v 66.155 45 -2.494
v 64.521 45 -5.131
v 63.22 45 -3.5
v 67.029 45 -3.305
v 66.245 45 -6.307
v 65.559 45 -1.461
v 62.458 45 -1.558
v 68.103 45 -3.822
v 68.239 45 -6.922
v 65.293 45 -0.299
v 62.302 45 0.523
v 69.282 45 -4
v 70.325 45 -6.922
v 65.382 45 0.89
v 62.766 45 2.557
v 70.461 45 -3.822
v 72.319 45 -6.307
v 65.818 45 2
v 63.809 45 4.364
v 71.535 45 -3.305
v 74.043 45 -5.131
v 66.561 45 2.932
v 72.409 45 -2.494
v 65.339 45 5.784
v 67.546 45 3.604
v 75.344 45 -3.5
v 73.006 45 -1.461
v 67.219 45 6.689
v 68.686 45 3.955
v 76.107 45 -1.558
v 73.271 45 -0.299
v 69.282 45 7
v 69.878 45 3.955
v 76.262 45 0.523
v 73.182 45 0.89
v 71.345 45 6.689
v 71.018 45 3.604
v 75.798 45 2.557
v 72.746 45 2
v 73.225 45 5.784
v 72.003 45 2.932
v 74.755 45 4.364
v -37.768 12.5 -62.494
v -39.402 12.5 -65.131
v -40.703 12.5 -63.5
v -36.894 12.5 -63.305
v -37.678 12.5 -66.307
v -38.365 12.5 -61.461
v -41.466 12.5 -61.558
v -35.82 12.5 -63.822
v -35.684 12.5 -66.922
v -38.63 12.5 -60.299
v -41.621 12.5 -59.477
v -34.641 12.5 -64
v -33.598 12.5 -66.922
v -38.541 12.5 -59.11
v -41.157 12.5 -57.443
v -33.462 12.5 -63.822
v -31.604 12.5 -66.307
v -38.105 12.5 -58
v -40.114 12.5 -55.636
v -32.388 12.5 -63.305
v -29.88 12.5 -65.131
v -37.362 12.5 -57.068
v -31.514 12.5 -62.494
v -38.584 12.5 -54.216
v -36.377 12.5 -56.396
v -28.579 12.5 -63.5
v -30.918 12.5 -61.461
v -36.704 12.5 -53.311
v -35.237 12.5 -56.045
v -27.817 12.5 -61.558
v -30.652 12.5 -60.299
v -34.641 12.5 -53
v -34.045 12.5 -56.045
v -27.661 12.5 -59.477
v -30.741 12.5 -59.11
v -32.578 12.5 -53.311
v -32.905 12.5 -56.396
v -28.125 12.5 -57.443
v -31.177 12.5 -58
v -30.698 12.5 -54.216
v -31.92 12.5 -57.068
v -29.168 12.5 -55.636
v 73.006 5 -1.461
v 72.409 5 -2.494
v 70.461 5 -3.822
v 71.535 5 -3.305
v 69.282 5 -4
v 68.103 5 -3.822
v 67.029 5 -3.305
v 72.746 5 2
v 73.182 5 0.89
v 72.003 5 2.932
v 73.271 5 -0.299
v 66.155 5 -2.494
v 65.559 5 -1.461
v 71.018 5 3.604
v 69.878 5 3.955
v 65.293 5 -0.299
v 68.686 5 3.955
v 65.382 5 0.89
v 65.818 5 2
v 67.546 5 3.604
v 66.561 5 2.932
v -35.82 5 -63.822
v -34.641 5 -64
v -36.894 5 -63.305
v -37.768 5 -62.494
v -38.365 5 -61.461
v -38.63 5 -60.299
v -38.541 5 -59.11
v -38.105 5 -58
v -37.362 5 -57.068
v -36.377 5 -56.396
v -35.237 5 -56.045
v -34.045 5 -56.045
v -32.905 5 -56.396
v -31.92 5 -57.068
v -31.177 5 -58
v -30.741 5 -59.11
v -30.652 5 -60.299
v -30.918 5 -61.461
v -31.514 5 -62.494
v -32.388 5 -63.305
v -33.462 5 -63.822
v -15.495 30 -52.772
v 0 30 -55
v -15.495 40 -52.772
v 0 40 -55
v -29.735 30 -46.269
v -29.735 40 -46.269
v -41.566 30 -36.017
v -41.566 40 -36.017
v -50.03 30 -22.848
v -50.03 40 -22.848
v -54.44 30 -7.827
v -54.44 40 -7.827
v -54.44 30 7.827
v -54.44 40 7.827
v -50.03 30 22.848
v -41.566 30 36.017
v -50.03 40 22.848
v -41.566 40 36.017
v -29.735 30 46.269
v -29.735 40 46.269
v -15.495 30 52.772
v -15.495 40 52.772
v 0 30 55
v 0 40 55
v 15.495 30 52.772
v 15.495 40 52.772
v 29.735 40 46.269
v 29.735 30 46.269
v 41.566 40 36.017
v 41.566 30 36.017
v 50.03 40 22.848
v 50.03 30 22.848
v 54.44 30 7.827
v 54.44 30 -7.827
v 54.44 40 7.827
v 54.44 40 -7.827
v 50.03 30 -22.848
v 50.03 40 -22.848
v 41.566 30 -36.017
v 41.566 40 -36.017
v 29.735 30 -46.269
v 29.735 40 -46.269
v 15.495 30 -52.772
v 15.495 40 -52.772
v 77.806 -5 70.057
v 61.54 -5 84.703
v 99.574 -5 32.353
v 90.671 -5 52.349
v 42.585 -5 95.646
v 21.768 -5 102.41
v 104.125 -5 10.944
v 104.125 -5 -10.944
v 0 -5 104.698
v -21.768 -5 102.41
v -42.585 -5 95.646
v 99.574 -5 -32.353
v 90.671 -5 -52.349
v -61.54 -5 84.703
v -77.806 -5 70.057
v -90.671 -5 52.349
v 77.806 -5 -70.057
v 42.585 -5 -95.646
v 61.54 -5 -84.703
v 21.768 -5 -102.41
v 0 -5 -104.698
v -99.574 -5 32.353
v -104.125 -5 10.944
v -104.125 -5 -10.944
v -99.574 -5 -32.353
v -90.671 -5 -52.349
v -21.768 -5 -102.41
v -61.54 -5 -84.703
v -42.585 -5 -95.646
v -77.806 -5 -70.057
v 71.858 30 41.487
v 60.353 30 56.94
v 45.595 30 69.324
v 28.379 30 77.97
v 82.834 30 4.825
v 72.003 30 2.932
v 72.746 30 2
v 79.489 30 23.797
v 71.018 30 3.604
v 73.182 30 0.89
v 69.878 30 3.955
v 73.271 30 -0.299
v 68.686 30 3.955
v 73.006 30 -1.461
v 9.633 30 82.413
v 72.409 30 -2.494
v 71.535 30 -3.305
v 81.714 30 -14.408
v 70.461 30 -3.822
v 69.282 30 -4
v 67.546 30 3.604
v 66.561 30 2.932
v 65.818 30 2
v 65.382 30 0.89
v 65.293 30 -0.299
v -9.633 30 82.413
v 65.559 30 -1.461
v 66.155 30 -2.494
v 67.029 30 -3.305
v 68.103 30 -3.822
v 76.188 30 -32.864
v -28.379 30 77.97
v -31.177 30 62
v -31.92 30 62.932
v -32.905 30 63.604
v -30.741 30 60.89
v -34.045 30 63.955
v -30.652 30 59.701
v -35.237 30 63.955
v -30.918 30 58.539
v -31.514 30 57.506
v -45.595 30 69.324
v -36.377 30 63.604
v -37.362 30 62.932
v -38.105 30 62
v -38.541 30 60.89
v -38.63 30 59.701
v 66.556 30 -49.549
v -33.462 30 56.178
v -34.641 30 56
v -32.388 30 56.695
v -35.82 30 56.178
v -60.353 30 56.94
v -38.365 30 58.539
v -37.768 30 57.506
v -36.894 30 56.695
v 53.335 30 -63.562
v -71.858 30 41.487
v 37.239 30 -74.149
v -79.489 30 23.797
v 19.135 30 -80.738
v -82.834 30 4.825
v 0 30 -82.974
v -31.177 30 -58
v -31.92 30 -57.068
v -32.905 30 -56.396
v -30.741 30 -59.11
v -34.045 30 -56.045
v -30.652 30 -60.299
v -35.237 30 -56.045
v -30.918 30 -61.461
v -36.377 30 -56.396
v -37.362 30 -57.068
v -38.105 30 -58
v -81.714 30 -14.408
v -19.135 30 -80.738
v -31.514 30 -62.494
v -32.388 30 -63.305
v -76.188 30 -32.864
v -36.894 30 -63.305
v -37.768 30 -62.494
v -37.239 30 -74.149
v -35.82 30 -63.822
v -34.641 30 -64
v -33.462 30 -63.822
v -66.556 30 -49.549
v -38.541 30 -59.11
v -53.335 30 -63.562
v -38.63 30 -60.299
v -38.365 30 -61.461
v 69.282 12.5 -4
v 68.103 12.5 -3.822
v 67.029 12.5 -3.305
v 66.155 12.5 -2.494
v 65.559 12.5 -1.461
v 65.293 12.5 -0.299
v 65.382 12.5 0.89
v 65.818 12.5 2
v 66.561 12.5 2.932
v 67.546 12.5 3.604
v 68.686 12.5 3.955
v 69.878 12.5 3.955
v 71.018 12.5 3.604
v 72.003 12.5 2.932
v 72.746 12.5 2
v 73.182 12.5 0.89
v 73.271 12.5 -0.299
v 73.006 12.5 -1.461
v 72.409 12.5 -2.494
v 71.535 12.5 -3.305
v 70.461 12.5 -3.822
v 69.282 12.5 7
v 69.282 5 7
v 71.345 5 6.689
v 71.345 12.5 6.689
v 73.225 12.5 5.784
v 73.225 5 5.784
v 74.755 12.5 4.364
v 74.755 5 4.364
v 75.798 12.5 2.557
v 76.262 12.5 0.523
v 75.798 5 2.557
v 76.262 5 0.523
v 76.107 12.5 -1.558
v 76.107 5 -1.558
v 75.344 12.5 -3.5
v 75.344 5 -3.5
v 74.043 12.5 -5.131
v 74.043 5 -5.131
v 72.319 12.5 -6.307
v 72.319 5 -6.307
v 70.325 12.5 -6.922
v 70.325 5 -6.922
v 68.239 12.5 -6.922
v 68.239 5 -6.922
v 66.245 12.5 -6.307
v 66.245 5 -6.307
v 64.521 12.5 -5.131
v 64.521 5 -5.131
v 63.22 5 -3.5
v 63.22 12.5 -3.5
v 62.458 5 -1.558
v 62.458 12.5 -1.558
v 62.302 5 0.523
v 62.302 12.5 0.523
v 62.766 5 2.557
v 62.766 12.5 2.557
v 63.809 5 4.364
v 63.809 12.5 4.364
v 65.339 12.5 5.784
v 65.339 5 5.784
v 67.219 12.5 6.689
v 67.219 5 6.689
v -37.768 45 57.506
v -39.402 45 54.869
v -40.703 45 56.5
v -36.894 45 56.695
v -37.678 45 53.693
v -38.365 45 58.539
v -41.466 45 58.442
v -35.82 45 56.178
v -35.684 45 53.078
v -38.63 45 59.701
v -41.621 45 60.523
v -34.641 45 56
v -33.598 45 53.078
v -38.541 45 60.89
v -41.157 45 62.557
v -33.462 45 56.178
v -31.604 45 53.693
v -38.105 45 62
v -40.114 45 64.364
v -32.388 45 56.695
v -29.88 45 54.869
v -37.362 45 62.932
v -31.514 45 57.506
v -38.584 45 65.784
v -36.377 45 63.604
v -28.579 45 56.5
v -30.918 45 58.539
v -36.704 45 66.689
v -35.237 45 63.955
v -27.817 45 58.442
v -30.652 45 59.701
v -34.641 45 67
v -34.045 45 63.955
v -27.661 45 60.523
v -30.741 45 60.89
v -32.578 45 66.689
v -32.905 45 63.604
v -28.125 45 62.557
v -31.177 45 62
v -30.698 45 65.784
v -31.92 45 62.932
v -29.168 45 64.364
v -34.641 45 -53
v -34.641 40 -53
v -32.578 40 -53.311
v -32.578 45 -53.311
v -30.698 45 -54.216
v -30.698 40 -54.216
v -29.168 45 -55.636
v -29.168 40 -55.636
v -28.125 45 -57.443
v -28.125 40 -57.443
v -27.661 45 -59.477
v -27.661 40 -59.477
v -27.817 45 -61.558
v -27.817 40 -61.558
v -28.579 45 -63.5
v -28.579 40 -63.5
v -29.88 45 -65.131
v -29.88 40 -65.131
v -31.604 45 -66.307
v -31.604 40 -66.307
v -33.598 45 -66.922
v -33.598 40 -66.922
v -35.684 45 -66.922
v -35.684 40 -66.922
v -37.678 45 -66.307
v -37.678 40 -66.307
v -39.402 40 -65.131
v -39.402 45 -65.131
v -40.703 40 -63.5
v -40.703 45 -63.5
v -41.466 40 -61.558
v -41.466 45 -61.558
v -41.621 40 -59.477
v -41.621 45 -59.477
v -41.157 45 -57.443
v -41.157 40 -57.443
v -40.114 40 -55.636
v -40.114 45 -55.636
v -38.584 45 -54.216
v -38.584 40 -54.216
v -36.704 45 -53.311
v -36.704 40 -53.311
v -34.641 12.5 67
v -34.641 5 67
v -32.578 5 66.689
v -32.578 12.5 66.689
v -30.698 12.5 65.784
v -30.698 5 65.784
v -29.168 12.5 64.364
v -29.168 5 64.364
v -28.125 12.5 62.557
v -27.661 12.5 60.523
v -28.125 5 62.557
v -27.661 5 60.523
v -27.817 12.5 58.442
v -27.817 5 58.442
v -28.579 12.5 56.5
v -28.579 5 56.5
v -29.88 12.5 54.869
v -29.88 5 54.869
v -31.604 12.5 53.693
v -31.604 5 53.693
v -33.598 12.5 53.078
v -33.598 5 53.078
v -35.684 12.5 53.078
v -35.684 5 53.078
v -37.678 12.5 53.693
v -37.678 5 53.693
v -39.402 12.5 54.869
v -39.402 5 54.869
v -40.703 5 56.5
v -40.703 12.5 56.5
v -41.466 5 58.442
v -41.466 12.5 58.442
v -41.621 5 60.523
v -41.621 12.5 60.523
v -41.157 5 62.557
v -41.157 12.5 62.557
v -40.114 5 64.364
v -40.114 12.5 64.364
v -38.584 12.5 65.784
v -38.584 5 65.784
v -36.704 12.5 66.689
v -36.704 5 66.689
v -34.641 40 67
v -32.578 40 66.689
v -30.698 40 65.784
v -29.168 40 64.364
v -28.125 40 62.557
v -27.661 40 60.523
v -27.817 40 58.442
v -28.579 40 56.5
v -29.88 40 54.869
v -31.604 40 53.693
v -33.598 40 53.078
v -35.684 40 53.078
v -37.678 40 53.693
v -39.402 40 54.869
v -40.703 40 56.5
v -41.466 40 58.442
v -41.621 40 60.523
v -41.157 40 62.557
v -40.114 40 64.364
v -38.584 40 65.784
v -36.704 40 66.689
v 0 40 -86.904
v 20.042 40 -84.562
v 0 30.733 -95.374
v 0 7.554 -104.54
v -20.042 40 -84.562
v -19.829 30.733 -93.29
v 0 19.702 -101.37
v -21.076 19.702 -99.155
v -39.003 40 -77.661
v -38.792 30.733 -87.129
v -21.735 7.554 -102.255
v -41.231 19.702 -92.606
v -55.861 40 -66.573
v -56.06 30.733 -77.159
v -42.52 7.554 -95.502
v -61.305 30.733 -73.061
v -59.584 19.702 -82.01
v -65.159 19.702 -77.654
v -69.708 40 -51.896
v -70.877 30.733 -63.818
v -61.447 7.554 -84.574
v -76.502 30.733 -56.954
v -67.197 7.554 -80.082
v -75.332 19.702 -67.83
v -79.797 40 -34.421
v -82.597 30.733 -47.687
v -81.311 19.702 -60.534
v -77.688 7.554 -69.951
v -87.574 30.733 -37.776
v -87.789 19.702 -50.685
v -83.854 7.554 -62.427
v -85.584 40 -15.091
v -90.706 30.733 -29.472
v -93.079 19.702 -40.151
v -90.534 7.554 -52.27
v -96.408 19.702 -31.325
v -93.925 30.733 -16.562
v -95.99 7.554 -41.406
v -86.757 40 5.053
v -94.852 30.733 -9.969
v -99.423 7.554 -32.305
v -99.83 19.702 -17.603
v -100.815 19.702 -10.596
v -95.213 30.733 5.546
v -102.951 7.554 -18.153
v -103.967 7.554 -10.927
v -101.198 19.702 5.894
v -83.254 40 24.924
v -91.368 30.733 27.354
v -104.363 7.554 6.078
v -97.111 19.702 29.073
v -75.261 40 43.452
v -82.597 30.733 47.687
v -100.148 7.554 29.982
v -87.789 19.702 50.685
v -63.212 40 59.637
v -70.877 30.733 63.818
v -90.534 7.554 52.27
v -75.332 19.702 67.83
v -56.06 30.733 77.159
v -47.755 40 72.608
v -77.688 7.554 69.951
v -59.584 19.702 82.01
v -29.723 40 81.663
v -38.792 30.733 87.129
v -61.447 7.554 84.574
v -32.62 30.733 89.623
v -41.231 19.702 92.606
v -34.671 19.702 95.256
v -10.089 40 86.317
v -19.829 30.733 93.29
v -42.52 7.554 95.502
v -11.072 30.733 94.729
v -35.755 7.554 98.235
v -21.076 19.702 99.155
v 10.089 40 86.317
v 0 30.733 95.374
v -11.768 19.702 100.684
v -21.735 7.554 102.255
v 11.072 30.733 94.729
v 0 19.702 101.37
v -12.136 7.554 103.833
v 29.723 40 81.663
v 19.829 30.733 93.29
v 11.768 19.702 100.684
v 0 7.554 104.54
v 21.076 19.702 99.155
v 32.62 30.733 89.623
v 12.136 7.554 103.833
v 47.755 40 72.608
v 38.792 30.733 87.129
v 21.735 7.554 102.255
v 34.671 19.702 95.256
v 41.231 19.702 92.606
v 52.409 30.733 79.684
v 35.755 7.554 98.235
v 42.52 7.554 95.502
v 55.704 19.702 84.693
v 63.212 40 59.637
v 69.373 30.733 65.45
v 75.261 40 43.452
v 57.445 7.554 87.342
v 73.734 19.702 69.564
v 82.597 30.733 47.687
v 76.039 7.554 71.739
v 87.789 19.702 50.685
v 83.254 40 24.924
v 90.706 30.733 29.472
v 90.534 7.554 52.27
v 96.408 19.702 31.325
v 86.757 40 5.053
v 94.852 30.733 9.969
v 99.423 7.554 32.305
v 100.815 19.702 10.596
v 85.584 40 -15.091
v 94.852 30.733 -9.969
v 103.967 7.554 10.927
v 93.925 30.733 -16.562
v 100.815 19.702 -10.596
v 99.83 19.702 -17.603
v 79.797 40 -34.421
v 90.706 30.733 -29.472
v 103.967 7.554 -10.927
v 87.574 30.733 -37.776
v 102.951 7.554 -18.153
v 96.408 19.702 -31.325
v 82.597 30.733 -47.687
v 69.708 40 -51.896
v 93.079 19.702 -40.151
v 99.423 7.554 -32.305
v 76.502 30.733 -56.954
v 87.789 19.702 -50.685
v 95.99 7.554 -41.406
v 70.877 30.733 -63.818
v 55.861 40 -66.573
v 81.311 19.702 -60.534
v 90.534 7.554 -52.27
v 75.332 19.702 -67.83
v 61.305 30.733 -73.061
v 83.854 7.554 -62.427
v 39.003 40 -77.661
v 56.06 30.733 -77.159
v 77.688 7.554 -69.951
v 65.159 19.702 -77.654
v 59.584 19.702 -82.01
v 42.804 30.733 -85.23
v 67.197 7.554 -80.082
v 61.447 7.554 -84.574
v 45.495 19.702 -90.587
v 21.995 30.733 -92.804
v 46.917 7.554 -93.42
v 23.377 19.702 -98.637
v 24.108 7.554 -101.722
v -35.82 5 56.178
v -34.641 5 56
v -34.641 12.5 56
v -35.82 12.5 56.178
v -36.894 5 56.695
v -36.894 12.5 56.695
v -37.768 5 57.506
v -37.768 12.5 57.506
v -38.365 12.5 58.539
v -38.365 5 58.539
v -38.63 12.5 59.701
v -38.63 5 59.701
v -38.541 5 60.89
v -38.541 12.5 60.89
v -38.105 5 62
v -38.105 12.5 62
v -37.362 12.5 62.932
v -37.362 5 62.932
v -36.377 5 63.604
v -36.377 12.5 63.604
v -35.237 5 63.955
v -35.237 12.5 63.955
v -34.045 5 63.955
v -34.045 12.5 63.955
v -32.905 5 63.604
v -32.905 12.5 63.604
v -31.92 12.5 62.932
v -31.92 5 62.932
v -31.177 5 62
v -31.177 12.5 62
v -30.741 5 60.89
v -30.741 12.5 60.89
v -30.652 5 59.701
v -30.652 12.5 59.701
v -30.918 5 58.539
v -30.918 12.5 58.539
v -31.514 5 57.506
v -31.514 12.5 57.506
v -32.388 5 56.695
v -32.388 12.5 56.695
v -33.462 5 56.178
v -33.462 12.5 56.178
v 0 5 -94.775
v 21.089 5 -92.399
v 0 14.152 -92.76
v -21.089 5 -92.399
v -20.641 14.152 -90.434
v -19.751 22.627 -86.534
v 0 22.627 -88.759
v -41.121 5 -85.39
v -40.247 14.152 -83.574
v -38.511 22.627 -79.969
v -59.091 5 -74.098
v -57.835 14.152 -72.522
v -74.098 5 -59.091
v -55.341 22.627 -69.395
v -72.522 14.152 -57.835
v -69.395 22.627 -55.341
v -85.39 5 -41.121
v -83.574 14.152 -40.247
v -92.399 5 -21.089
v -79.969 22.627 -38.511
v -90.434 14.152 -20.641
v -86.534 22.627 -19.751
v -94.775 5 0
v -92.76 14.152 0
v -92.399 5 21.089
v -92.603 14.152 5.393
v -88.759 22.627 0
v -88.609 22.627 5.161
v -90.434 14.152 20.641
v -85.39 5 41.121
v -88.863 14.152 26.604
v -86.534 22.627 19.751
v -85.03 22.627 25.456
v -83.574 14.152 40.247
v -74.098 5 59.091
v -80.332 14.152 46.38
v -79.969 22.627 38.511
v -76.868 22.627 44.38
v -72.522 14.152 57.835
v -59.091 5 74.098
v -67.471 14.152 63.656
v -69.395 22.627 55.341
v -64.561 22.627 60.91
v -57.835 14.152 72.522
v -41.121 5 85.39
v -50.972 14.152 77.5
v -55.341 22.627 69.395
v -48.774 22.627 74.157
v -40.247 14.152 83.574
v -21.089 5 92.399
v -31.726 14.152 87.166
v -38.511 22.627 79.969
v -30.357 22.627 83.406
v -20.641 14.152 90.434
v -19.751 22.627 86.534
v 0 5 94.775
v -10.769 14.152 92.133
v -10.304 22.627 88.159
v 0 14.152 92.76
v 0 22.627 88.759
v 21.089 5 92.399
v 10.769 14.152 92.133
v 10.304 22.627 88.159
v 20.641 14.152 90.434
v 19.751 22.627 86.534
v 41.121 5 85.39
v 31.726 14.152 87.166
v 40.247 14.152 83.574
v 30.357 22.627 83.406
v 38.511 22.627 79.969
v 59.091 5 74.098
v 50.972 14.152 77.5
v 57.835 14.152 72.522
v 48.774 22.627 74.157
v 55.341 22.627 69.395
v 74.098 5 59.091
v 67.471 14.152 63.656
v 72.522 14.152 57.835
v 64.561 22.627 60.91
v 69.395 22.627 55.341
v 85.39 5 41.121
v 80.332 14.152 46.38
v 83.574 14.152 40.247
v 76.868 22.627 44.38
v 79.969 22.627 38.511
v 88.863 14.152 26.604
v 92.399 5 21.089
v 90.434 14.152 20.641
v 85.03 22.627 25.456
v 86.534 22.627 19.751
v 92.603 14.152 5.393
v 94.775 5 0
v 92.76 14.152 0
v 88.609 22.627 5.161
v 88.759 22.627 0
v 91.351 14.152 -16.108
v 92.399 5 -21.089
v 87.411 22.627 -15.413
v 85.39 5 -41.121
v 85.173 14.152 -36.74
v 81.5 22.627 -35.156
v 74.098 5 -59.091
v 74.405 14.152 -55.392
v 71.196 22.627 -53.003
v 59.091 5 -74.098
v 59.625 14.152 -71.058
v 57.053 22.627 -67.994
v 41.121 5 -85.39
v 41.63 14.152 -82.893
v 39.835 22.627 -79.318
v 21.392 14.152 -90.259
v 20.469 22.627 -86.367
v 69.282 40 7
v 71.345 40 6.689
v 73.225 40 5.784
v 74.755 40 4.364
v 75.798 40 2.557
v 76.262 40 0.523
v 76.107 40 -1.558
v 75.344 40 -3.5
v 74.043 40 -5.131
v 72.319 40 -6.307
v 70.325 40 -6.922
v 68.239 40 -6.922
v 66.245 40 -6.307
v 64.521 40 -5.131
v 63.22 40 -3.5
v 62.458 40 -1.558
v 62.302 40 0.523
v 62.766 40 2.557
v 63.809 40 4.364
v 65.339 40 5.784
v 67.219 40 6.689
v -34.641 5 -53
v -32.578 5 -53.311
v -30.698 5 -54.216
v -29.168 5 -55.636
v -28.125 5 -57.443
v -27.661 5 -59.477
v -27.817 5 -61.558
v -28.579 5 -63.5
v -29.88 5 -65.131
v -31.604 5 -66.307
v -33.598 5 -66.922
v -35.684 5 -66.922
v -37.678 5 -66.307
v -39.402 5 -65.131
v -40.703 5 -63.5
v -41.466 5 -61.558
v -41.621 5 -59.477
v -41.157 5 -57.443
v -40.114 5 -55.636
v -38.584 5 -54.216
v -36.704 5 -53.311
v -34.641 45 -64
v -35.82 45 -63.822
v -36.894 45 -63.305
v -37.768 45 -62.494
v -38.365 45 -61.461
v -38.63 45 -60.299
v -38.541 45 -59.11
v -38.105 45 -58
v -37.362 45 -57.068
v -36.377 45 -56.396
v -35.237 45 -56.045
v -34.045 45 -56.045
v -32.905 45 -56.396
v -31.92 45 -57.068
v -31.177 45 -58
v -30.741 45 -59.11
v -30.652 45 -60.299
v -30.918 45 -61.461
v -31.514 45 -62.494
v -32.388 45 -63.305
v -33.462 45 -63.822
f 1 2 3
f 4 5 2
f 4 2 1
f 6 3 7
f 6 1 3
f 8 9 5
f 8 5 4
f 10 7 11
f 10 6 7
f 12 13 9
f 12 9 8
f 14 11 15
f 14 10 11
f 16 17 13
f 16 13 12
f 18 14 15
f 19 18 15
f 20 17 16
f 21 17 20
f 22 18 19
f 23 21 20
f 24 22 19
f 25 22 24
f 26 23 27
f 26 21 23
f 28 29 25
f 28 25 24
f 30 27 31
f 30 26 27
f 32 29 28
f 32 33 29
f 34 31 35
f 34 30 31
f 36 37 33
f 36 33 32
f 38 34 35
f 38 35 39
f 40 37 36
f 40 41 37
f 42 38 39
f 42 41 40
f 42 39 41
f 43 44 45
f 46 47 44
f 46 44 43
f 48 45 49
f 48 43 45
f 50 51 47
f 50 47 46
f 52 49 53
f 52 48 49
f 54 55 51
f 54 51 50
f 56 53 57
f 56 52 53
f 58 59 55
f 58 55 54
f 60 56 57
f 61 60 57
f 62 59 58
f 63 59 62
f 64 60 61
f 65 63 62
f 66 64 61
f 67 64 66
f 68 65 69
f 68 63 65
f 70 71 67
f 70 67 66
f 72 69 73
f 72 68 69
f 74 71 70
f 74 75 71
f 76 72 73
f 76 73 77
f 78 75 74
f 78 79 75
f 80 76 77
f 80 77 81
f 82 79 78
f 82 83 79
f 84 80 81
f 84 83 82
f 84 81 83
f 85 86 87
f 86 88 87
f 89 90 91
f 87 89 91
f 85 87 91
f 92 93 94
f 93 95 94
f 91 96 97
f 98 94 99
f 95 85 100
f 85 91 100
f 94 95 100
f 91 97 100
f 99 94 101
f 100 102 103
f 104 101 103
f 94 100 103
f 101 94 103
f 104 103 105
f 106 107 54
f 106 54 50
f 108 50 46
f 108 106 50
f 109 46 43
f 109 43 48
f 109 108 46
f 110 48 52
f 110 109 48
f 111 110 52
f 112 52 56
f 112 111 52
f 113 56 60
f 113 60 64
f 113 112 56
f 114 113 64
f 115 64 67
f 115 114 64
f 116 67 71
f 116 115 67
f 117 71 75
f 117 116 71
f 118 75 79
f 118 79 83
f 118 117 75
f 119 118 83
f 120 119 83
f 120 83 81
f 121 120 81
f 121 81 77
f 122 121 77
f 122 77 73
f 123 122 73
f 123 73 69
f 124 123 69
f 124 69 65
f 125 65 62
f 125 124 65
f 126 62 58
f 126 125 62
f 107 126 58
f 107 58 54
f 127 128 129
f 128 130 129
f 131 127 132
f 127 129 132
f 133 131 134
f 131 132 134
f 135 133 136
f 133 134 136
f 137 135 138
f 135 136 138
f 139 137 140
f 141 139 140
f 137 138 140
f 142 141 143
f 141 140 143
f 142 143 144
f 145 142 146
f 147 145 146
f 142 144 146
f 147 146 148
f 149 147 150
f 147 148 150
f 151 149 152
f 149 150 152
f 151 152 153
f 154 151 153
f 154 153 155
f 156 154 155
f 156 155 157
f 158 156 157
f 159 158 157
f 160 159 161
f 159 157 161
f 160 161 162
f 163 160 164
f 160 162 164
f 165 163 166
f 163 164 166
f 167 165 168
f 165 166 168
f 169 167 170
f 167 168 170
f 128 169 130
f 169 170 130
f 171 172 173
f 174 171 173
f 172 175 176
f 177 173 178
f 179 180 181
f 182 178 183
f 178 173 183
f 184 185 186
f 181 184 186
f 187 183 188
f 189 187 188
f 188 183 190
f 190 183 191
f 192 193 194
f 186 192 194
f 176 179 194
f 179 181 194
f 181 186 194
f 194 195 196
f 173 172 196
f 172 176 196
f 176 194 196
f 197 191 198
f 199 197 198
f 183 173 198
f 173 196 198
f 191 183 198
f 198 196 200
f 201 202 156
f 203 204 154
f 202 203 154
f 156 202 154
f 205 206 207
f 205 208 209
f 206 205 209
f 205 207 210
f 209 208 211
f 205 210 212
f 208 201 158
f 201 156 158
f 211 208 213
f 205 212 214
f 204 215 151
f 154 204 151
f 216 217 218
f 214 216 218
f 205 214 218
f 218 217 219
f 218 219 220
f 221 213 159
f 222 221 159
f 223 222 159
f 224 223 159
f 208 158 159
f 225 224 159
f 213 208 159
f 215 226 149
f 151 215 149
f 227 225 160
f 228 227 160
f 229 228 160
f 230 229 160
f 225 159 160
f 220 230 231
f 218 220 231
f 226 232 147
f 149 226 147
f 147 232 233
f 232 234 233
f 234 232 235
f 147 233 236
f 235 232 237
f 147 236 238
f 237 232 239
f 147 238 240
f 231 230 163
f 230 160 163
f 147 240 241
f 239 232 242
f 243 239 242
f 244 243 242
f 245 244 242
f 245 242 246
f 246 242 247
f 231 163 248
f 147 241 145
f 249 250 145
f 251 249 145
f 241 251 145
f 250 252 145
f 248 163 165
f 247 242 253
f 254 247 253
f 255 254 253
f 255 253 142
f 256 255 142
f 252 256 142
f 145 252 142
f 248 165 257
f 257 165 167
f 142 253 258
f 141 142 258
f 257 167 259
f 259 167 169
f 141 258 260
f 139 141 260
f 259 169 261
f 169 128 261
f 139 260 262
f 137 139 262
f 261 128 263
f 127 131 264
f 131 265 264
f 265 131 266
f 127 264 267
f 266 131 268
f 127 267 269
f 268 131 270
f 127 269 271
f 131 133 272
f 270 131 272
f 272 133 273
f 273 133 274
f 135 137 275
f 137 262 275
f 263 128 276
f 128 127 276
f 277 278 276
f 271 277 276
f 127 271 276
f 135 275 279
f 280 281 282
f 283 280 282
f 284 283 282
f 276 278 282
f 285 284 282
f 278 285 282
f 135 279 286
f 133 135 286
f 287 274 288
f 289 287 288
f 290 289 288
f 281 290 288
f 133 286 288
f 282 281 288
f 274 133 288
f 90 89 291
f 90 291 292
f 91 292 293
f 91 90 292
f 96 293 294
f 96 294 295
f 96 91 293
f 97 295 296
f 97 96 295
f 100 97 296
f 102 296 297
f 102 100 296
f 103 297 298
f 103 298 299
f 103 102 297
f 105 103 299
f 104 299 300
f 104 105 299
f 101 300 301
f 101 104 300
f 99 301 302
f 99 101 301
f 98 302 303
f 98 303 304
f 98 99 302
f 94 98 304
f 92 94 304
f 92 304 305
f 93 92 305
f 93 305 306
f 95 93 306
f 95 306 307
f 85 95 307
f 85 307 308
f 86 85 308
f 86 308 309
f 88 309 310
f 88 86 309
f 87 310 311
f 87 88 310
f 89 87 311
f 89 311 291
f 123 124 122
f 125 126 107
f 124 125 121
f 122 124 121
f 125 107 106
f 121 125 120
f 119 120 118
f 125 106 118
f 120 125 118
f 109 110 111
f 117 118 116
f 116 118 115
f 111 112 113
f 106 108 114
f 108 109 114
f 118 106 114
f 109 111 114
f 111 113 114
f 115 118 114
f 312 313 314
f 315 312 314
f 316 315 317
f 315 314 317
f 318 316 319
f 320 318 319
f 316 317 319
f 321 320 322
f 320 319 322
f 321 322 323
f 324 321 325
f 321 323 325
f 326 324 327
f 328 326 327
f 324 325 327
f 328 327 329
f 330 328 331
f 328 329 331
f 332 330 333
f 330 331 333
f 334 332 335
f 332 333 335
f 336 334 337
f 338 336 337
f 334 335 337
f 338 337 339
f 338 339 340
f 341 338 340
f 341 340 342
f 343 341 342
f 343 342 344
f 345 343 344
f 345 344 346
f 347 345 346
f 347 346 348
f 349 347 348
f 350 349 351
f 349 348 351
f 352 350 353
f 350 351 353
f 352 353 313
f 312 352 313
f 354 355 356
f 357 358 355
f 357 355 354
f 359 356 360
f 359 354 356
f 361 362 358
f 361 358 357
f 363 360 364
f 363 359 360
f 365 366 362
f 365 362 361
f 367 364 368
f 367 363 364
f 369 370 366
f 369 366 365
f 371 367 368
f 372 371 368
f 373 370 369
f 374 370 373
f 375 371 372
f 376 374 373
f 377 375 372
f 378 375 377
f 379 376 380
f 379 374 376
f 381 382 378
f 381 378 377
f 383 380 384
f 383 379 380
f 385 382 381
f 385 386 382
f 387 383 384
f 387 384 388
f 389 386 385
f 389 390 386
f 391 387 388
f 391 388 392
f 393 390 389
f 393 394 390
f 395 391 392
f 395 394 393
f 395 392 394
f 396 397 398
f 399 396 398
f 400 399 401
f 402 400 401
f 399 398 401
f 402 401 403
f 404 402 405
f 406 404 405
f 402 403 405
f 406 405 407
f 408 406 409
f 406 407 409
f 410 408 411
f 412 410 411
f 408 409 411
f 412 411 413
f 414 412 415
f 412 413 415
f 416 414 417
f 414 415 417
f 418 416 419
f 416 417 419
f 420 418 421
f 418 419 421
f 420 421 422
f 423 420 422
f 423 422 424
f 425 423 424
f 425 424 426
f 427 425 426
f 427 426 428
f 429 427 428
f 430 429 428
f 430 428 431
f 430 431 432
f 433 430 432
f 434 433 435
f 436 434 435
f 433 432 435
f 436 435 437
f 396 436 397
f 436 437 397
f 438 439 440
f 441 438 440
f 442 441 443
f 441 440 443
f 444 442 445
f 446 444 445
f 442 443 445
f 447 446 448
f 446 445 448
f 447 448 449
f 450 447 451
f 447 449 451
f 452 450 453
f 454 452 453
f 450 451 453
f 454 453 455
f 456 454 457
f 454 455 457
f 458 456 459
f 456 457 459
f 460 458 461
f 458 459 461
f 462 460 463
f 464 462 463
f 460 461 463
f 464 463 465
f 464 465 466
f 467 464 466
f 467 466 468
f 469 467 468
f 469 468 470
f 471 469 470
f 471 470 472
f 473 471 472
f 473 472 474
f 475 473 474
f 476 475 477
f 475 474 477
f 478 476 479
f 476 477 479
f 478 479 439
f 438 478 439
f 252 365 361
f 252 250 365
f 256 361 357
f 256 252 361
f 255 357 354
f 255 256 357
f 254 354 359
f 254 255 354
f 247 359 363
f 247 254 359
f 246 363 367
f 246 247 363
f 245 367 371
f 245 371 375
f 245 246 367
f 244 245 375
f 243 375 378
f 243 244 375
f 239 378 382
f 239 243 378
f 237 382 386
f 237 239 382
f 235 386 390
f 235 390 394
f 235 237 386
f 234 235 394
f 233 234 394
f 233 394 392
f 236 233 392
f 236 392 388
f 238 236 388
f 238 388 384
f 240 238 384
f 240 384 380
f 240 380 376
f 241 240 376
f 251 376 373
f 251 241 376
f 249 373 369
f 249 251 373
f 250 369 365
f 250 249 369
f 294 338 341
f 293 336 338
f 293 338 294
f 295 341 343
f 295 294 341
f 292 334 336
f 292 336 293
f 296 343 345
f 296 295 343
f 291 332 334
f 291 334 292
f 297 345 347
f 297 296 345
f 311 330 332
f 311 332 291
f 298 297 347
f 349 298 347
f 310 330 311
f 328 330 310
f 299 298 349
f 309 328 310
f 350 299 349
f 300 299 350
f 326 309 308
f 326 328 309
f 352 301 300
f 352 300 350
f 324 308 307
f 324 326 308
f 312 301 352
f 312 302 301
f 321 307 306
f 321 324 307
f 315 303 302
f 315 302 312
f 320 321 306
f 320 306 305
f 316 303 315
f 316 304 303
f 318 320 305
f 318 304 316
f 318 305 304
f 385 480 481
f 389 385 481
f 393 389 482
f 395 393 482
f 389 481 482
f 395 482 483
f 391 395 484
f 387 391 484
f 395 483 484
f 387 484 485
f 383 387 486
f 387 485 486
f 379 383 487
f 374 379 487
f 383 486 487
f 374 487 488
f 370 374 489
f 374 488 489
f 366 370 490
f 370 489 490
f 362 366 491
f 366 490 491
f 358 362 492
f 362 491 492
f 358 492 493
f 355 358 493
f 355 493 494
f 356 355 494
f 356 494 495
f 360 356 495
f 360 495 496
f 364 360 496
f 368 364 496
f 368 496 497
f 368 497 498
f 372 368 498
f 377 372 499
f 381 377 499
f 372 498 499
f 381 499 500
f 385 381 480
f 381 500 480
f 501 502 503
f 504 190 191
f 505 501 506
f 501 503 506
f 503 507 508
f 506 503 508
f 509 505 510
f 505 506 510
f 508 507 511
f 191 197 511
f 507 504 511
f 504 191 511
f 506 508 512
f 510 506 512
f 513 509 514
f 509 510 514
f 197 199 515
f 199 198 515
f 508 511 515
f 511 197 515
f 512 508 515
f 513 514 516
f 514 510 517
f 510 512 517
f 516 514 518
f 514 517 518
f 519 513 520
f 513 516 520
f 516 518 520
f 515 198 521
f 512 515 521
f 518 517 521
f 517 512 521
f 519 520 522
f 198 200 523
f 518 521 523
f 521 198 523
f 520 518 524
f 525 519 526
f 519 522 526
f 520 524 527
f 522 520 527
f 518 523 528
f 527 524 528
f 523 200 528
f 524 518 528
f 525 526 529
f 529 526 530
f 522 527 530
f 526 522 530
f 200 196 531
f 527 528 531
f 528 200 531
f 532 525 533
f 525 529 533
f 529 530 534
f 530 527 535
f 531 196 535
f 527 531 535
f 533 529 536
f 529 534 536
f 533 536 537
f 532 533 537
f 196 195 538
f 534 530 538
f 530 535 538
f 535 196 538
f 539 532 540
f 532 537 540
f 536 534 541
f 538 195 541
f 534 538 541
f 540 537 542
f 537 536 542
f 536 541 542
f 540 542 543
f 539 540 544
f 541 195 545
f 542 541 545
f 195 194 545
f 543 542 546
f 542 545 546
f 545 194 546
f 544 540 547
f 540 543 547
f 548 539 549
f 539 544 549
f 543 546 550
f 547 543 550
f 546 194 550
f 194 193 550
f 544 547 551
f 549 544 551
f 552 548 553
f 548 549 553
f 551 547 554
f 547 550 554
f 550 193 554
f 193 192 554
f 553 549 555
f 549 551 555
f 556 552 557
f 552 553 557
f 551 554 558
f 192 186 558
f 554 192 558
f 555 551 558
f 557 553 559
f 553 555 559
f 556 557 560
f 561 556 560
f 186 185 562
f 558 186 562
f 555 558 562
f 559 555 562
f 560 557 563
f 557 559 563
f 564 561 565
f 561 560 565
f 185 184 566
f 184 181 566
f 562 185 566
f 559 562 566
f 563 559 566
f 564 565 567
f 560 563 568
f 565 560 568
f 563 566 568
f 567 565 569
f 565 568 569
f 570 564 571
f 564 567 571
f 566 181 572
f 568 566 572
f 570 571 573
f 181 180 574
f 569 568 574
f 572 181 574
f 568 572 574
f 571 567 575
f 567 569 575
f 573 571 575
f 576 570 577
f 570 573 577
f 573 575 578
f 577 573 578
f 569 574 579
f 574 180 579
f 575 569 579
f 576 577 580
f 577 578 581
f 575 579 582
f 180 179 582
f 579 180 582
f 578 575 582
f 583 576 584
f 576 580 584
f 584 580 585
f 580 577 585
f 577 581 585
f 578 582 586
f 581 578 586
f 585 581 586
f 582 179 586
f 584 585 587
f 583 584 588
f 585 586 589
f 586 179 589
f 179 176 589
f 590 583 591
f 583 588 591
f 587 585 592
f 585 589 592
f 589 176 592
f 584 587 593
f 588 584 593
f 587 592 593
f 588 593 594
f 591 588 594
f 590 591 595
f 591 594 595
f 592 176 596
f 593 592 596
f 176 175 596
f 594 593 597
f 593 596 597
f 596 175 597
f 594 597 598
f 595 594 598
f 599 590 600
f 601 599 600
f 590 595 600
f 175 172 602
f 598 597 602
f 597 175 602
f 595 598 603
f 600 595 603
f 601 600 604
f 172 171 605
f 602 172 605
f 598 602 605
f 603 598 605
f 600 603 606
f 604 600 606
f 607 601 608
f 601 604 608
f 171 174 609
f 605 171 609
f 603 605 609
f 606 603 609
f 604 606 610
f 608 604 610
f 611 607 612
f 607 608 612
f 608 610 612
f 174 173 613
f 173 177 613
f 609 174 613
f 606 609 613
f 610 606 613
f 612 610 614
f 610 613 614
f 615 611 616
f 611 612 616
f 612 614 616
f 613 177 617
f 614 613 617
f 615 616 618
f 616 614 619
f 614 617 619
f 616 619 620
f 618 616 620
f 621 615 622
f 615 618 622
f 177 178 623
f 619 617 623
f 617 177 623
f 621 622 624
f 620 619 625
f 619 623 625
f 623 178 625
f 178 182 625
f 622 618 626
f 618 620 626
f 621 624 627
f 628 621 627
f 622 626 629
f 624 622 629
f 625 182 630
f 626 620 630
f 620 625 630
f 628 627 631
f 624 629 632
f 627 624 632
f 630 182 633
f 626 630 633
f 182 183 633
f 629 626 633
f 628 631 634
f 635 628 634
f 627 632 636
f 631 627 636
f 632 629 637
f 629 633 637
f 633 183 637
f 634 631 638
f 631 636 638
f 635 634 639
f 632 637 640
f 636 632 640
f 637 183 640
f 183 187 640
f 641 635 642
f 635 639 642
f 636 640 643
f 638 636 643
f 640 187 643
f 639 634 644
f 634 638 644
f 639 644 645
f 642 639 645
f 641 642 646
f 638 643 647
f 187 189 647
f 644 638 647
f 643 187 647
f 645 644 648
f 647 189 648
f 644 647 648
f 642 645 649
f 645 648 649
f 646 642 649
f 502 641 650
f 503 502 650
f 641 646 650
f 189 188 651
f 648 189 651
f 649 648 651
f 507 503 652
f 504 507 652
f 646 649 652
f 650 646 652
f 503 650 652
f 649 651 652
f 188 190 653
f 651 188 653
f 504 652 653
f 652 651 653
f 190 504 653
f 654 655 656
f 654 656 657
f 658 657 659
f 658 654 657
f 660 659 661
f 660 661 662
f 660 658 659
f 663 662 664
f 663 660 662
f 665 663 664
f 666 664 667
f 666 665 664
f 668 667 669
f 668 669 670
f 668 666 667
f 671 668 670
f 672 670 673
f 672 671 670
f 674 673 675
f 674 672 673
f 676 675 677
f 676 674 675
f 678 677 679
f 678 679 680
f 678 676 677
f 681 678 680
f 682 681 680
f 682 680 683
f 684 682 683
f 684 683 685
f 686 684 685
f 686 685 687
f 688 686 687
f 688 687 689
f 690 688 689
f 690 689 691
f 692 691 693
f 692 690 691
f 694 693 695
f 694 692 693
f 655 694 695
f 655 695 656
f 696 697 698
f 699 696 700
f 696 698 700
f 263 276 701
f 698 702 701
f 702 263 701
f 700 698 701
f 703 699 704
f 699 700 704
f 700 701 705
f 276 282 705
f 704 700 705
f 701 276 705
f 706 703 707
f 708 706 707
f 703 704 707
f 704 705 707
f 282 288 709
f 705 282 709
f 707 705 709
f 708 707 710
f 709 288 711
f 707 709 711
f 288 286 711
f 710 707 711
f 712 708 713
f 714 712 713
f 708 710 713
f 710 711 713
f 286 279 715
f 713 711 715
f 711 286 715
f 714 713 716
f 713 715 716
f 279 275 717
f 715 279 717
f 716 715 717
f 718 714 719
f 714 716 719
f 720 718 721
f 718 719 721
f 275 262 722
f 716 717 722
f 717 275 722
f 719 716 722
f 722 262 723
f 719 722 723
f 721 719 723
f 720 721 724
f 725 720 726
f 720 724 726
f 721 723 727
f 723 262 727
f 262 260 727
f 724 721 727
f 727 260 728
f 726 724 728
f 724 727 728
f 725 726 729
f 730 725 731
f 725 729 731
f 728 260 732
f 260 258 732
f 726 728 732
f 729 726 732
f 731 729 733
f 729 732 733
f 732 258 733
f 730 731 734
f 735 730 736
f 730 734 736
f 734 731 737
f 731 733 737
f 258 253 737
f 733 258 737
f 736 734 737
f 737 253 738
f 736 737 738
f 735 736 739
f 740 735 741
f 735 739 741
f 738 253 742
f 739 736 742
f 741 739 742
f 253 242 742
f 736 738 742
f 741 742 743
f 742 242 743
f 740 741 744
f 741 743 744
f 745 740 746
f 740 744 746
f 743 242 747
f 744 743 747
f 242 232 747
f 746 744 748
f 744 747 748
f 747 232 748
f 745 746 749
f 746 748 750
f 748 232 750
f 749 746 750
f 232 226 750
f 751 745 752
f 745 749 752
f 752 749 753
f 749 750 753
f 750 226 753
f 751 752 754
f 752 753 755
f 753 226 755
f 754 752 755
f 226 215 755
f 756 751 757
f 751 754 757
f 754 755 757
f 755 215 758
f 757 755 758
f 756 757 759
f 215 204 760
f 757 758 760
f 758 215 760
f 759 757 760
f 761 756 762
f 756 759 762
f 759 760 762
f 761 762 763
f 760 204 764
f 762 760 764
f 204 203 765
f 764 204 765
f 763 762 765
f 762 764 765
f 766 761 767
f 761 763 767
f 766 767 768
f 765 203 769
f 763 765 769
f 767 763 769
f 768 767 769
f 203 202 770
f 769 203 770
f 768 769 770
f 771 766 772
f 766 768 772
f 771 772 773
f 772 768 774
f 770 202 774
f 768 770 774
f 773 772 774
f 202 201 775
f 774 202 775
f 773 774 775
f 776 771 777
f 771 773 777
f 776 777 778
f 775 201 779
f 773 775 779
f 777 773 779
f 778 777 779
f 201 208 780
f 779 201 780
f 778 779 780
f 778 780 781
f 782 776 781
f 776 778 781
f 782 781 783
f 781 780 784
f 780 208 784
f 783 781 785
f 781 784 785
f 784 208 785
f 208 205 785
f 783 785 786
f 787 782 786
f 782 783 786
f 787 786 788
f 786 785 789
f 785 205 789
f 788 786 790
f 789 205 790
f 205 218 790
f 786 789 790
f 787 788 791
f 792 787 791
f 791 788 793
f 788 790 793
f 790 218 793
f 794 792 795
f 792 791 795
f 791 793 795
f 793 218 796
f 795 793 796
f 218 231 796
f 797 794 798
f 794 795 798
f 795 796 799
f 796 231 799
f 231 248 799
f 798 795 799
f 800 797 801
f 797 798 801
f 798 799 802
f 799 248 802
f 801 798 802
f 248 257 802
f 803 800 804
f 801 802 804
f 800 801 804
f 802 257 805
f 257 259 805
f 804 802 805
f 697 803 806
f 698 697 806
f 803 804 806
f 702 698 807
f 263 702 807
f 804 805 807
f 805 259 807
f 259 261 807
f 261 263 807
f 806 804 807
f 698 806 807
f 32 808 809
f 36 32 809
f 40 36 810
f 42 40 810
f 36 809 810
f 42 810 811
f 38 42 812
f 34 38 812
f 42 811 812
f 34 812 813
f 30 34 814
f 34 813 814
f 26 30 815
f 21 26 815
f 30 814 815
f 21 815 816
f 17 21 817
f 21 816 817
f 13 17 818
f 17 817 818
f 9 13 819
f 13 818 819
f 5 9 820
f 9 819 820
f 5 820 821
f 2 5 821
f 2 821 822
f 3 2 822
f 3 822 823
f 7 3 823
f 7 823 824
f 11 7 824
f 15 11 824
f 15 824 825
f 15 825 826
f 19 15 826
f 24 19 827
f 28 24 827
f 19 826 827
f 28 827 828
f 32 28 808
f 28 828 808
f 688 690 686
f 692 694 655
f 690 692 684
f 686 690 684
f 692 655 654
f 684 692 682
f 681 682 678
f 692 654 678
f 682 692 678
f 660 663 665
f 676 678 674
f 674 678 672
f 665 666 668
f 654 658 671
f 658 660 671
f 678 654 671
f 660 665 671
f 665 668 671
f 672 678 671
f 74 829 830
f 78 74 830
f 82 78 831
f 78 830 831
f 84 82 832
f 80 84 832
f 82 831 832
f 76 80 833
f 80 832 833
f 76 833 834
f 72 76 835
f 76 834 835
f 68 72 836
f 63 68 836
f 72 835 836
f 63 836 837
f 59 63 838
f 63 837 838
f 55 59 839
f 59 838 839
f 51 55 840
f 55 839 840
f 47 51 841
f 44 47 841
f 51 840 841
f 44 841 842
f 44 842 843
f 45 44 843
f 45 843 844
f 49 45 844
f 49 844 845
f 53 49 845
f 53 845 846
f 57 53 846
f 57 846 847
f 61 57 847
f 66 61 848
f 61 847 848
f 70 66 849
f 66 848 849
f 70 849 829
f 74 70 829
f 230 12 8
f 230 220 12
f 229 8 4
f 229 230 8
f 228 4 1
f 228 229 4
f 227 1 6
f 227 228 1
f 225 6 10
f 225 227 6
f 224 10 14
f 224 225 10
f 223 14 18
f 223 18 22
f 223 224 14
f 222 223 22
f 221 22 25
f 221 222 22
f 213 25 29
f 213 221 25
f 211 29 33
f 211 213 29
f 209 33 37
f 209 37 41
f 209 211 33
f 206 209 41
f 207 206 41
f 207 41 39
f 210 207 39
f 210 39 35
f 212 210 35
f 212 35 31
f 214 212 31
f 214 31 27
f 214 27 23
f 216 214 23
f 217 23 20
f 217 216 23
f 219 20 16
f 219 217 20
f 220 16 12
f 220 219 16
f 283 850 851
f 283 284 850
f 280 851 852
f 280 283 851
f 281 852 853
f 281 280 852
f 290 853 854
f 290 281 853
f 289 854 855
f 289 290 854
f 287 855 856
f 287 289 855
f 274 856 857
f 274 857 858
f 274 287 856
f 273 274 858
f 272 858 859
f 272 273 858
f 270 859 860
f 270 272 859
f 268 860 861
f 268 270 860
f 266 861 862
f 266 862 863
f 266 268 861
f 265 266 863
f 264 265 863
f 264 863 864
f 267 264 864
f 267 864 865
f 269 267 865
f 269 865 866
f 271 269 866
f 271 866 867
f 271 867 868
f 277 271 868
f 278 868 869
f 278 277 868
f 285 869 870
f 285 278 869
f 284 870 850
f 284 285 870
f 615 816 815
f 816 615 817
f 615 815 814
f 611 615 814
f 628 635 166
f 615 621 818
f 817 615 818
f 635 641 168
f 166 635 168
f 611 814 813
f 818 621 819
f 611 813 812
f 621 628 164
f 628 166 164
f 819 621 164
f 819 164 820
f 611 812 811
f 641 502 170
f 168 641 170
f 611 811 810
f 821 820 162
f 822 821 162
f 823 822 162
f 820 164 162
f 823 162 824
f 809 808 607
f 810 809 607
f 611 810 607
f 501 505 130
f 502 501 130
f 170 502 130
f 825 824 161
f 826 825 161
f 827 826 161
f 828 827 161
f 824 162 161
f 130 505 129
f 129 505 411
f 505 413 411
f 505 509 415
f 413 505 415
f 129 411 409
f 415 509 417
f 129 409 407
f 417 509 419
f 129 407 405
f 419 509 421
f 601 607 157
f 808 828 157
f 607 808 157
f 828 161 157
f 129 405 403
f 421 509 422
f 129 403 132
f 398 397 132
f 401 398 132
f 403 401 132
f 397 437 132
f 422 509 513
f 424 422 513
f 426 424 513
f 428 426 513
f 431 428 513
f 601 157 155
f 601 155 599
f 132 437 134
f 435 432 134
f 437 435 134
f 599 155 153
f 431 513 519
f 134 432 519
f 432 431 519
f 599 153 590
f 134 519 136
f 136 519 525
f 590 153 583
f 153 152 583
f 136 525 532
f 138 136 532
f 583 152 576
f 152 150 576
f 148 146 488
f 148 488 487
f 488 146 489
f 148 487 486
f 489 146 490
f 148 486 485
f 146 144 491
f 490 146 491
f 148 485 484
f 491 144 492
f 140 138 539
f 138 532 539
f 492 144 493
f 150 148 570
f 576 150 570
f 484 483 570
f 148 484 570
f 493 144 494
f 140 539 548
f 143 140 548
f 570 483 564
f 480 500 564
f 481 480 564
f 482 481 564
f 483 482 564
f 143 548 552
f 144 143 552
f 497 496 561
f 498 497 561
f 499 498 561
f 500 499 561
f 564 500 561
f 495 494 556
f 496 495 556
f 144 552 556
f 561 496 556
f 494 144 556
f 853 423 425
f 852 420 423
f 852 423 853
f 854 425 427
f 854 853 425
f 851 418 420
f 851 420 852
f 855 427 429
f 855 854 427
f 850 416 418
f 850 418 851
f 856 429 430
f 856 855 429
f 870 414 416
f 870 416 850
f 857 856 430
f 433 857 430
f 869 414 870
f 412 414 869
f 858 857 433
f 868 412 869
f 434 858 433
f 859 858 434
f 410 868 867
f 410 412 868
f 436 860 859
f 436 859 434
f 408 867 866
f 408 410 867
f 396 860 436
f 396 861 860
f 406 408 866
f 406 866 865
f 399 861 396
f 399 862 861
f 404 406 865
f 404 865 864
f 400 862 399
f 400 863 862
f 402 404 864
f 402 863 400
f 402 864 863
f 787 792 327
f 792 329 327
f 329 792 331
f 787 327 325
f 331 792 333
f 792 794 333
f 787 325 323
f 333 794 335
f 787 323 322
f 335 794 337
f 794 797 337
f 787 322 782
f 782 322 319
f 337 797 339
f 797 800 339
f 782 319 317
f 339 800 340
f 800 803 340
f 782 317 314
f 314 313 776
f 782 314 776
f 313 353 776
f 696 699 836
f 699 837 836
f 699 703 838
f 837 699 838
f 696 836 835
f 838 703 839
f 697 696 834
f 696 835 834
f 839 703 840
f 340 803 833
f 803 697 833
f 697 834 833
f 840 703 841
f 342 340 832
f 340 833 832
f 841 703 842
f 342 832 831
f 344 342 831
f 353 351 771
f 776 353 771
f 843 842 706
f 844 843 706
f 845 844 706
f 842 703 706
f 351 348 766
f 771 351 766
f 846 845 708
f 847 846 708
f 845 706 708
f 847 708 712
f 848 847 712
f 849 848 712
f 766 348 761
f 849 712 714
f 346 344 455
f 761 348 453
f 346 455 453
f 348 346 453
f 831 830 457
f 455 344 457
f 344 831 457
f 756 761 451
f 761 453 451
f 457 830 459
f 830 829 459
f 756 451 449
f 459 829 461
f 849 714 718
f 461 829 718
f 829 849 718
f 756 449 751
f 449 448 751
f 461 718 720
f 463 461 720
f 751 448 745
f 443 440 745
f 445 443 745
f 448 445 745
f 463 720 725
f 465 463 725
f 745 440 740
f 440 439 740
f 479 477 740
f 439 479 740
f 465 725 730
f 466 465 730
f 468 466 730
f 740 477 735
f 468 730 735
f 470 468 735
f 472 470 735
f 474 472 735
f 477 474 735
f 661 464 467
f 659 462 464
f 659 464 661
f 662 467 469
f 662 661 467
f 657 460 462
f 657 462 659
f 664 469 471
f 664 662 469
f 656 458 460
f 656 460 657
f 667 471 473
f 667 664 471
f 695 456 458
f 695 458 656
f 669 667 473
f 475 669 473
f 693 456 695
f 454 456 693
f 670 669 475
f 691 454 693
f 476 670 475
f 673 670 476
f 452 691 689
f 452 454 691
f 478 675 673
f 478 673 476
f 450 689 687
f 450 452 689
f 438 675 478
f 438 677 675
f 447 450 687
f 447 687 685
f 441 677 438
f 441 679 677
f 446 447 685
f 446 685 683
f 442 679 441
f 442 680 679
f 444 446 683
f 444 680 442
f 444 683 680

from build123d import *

# Parameters (mm, degrees)
SKETCH4_R           = 4
CUT_EXTRUDE1_DEPTH  = 35
SKETCH5_R           = 7
SKETCH5_R_2         = 4
BOSS_EXTRUDE1_DEPTH = 7.5
SKETCH6_R           = 7
SKETCH6_R_2         = 4
BOSS_EXTRUDE3_DEPTH = 5


with BuildPart() as part:
    # Sketch2 → Revolve-Thin7 (revolve)
    with BuildSketch(Plane(origin=(0, 0, 0), x_dir=(0, 0, -1), z_dir=(1, 0, 0)), mode=Mode.PRIVATE) as revolve_thin7_sk:
        with BuildLine():
            Line((0, 5), (-94.77522535, 5))
            ThreePointArc((-94.77522535, 5), (-90.99735594, 18.501939345), (-82.974310102, 30))
            Line((-82.974310102, 30), (-55, 30))
            Line((-55, 30), (-55, 40))
            Line((-55, 40), (-86.90441422, 40))
            ThreePointArc((-86.90441422, 40), (-101.369835612, 19.701900438), (-104.698104926, -5))
            Line((-104.698104926, -5), (0, -5))
            Line((0, -5), (0, 5))
        make_face()
    revolve(revolve_thin7_sk.sketch.rotate(Axis((0, 0, 0), (0, 1, 0)), 180), axis=Axis((0, 0, 0), (0, 1, 0)))

    # Sketch4 → Cut-Extrude1 (cut)
    with BuildSketch(Plane(origin=(0, 5, 0), x_dir=(1, 0, 0), z_dir=(0, 1, 0))):
        with Locations(Location((69.282032303, 0, 0), (0, 0, 90))):
            Circle(SKETCH4_R)
        with Locations(Location((-34.641016151, 60, 0), (0, 0, 90))):
            Circle(SKETCH4_R)
        with Locations(Location((-34.641016151, -60, 0), (0, 0, 90))):
            Circle(SKETCH4_R)
    extrude(amount=CUT_EXTRUDE1_DEPTH, mode=Mode.SUBTRACT)

    # Sketch5 → Boss-Extrude1 (add)
    # profile 1 of 3: a face of its own
    with BuildSketch(Plane(origin=(0, 5, 0), x_dir=(1, 0, 0), z_dir=(0, 1, 0))):
        with Locations(Location((-34.641016151, 60, 0), (0, 0, 270))):
            Circle(SKETCH5_R)
        with Locations(Location((-34.641016151, 60, 0), (0, 0, 90))):
            Circle(SKETCH5_R_2, mode=Mode.SUBTRACT)
    # profile 2 of 3: a face of its own
    with BuildSketch(Plane(origin=(0, 5, 0), x_dir=(1, 0, 0), z_dir=(0, 1, 0))):
        with Locations(Location((-34.641016151, -60, 0), (0, 0, 270))):
            Circle(SKETCH5_R)
        with Locations(Location((-34.641016151, -60, 0), (0, 0, 90))):
            Circle(SKETCH5_R_2, mode=Mode.SUBTRACT)
    # profile 3 of 3: a face of its own
    with BuildSketch(Plane(origin=(0, 5, 0), x_dir=(1, 0, 0), z_dir=(0, 1, 0))):
        with Locations(Location((69.282032303, 0, 0), (0, 0, 270))):
            Circle(SKETCH5_R)
        with Locations(Location((69.282032303, 0, 0), (0, 0, 90))):
            Circle(SKETCH5_R_2, mode=Mode.SUBTRACT)
    extrude(amount=BOSS_EXTRUDE1_DEPTH)

    # Sketch6 → Boss-Extrude3 (add)
    # profile 1 of 3: a face of its own
    with BuildSketch(Plane(origin=(0, 40, 0), x_dir=(1, 0, 0), z_dir=(0, 1, 0))):
        with Locations(Location((-34.641016151, -60, 0), (0, 0, 270))):
            Circle(SKETCH6_R)
        with Locations(Location((-34.641016151, -60, 0), (0, 0, 90))):
            Circle(SKETCH6_R_2, mode=Mode.SUBTRACT)
    # profile 2 of 3: a face of its own
    with BuildSketch(Plane(origin=(0, 40, 0), x_dir=(1, 0, 0), z_dir=(0, 1, 0))):
        with Locations(Location((-34.641016151, 60, 0), (0, 0, 270))):
            Circle(SKETCH6_R)
        with Locations(Location((-34.641016151, 60, 0), (0, 0, 90))):
            Circle(SKETCH6_R_2, mode=Mode.SUBTRACT)
    # profile 3 of 3: a face of its own
    with BuildSketch(Plane(origin=(0, 40, 0), x_dir=(1, 0, 0), z_dir=(0, 1, 0))):
        with Locations(Location((69.282032303, 0, 0), (0, 0, 270))):
            Circle(SKETCH6_R)
        with Locations(Location((69.282032303, 0, 0), (0, 0, 90))):
            Circle(SKETCH6_R_2, mode=Mode.SUBTRACT)
    extrude(amount=BOSS_EXTRUDE3_DEPTH)


solid = part.part
